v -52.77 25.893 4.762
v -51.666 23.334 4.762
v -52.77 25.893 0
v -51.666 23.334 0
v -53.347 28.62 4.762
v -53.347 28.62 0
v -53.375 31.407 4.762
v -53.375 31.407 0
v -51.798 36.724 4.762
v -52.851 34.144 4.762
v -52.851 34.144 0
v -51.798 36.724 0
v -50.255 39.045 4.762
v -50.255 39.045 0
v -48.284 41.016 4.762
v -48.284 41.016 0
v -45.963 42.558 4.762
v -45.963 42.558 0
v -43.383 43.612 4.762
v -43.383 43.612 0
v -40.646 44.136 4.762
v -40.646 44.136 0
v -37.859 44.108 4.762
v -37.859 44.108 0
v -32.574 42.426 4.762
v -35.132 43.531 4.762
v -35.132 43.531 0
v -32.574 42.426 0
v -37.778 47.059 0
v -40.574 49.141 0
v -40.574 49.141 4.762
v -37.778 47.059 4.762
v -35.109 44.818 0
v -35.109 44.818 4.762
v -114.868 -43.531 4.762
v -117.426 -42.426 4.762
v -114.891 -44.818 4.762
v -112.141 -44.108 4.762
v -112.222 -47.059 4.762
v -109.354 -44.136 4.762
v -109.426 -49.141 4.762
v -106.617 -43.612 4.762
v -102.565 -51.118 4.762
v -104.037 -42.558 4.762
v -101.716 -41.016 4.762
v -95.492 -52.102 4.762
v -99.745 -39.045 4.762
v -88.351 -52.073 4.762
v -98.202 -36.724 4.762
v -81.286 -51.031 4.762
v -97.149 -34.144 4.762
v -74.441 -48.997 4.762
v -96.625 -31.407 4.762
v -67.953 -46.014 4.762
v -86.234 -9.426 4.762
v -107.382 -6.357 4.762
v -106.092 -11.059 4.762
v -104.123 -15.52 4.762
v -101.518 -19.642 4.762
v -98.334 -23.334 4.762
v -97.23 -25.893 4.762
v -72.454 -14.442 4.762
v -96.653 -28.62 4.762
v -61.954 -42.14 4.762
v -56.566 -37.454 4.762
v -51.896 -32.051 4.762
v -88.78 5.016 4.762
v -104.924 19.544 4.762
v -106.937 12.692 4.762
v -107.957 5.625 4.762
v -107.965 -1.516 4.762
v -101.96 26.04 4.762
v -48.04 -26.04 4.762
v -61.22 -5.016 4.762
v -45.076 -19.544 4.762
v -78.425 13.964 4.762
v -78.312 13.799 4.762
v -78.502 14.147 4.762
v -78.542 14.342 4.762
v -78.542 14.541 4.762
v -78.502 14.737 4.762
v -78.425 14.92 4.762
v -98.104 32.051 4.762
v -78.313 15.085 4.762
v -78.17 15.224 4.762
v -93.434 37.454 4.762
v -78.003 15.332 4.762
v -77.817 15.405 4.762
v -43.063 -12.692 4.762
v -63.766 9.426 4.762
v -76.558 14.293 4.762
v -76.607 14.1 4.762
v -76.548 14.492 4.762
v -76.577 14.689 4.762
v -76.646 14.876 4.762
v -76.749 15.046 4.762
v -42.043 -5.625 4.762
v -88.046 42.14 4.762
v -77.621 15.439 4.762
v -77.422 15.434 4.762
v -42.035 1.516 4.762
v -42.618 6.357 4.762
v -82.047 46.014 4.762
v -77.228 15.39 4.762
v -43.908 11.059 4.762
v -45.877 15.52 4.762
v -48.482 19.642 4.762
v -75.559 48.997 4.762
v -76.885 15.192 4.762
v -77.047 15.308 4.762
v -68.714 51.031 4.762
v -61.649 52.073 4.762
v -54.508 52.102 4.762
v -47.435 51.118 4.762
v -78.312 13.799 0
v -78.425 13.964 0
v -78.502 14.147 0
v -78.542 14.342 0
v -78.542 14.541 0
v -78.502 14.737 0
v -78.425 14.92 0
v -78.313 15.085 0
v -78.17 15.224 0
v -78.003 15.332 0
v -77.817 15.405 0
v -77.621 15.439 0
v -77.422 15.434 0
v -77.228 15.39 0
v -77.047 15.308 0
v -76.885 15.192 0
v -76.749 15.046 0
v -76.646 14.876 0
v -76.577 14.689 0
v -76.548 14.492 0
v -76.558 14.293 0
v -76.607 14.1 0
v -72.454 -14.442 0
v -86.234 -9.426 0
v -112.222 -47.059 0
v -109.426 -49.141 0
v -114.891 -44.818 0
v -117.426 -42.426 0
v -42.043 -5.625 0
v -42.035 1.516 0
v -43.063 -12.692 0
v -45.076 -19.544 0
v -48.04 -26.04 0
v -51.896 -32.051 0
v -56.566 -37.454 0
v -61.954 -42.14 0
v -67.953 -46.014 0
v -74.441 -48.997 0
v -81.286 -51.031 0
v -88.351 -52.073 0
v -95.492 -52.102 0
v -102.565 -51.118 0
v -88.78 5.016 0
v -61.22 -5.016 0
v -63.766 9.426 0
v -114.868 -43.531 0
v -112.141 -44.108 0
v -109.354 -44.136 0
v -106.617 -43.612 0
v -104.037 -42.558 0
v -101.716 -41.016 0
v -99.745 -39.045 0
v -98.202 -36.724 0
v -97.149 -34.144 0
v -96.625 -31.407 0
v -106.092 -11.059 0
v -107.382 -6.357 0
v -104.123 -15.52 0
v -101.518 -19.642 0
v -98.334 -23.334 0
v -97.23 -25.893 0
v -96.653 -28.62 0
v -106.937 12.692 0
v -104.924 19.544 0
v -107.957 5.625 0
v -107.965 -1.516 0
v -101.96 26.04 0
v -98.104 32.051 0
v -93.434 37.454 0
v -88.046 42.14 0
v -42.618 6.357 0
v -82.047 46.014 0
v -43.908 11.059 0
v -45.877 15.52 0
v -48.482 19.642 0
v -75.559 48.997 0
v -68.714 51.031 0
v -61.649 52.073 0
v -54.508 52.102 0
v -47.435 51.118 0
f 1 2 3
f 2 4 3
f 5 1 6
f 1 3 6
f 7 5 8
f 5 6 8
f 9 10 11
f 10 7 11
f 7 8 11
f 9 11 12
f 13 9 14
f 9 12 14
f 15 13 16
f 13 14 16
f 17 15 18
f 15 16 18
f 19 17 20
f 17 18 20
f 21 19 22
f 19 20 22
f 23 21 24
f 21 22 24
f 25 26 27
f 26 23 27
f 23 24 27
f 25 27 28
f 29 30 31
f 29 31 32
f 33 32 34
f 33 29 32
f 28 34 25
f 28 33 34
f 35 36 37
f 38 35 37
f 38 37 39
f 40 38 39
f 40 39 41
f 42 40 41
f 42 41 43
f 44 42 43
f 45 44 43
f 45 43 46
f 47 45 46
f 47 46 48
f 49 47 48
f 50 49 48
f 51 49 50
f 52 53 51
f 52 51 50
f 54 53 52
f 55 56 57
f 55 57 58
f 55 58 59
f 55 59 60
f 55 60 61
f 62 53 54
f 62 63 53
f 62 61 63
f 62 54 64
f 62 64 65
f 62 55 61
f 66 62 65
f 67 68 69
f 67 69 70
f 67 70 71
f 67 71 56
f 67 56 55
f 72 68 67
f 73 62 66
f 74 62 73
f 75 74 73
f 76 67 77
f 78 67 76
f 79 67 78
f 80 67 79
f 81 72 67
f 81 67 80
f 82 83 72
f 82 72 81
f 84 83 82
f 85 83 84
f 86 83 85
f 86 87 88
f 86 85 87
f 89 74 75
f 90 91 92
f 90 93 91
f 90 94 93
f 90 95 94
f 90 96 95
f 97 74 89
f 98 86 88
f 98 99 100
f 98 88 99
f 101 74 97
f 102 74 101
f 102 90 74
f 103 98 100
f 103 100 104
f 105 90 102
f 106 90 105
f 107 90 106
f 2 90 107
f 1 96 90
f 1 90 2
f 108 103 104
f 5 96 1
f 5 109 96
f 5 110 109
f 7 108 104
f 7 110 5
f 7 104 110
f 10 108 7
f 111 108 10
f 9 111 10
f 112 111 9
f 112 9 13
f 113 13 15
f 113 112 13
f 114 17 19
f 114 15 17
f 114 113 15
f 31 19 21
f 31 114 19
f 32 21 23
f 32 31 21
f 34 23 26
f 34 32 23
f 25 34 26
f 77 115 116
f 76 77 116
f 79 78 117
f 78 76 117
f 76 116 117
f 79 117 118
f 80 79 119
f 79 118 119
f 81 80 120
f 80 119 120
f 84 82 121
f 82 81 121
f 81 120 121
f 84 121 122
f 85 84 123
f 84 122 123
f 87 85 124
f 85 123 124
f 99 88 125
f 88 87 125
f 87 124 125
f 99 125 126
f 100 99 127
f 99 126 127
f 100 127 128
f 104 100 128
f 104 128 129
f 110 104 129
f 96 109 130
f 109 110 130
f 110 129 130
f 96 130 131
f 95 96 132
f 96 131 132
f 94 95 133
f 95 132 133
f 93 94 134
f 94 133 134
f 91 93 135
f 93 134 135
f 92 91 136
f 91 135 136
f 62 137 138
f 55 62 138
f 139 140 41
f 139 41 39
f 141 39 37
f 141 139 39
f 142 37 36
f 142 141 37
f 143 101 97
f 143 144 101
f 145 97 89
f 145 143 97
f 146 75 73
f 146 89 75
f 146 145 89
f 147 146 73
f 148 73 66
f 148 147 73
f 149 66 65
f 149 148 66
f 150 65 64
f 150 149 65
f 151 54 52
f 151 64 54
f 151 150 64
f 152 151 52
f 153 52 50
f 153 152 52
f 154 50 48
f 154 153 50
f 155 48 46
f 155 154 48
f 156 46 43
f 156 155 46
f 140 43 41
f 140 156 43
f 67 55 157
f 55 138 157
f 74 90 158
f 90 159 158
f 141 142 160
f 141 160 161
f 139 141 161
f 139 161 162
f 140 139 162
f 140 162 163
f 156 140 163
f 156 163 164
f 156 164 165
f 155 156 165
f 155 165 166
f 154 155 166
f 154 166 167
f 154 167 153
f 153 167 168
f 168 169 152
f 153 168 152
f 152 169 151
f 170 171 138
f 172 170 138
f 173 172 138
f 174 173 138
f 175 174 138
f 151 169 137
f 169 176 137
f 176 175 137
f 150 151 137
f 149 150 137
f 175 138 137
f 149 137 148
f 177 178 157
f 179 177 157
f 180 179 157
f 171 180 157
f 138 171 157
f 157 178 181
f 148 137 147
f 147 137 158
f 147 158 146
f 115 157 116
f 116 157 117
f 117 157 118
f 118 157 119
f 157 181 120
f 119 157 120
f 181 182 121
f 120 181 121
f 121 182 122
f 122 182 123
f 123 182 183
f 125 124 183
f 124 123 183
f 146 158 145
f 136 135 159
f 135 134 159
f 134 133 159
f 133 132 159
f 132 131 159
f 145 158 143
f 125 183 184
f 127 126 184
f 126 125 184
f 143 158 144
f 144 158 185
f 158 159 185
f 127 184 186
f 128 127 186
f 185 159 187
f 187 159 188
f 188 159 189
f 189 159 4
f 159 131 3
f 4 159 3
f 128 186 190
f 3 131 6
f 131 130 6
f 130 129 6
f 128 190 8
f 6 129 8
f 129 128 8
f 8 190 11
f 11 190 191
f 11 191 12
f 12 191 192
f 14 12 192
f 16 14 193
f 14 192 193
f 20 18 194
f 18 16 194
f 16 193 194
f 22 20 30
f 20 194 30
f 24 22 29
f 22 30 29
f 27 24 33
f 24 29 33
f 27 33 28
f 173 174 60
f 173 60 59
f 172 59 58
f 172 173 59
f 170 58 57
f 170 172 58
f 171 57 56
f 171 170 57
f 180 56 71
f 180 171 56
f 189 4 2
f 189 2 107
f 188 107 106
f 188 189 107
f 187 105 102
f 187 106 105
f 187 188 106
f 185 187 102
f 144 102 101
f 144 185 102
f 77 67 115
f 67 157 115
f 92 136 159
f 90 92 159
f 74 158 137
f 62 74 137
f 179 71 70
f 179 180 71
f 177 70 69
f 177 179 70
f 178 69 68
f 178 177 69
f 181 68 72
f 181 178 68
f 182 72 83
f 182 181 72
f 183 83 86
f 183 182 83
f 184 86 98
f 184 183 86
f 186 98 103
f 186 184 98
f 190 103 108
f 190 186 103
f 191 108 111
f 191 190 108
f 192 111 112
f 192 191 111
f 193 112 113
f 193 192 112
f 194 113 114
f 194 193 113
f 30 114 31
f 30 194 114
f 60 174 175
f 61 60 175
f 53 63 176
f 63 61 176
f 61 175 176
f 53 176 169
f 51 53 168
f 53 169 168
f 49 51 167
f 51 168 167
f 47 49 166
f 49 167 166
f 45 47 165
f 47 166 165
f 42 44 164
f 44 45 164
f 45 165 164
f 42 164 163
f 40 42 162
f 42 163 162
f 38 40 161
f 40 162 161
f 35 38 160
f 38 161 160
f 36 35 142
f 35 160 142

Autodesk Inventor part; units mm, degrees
ref_plane "YZ Plane" through (0, 0, 0) normal (1, 0, 0) x (0, 1, 0)
ref_plane "XZ Plane" through (0, 0, 0) normal (0, 1, 0) x (-1, 0, 0)
ref_plane "XY Plane" through (0, 0, 0) normal (0, 0, 1) x (1, 0, 0)
sketch "Sketch1" plane through (0, 0, 0) normal (0, 0, 1) x (1, 0, 0)
  arc A0 (-32.5736, 42.4264) -> (-51.6655, 23.3345) centre (-39.3901, 30.151) ccw
  arc A1 (-32.5736, 42.4264) -> (-40.5736, 49.1408) centre (-75, 0) ccw
  arc A2 (-40.5736, 49.1408) -> (-107.9651, -1.5164) centre (-57.8736, 2.0002) ccw
  arc A3 (-107.9651, -1.5164) -> (-98.3345, -23.3345) centre (-75, 0) ccw
  arc A4 (-117.4264, -42.4264) -> (-98.3345, -23.3345) centre (-110.6099, -30.151) ccw
  arc A5 (-117.4264, -42.4264) -> (-109.4264, -49.1408) centre (-75, 0) ccw
  arc A6 (-109.4264, -49.1408) -> (-42.0348, 1.5164) centre (-92.1264, -2.0002) ccw
  arc A7 (-42.0348, 1.5164) -> (-51.6655, 23.3345) centre (-75, 0) ccw
  line L0 (-76.6068, 14.0999) -> (-63.7662, 9.4263)
  line L1 (-63.7662, 9.4263) -> (-61.2197, -5.0156)
  line L2 (-61.2197, -5.0156) -> (-72.4535, -14.4419)
  line L3 (-72.4535, -14.4419) -> (-86.2338, -9.4263)
  line L4 (-86.2338, -9.4263) -> (-88.7803, 5.0156)
  line L5 (-88.7803, 5.0156) -> (-78.3125, 13.7991)
  arc A8 (-76.6068, 14.0999) -> (-78.3125, 13.7991) centre (-77.5465, 14.4419) ccw
  arc A9 (-40.5736, 49.1408) -> (-107.9651, -1.5164) centre (-57.8736, 2.0002) ccw
  arc A10 (-107.9651, -1.5164) -> (-98.3345, -23.3345) centre (-75, 0) ccw
  arc A11 (-117.4264, -42.4264) -> (-98.3345, -23.3345) centre (-110.6099, -30.151) ccw
  arc A12 (-117.4264, -42.4264) -> (-109.4264, -49.1408) centre (-75, 0) ccw
  arc A13 (-109.4264, -49.1408) -> (-42.0348, 1.5164) centre (-92.1264, -2.0002) ccw
  arc A14 (-42.0348, 1.5164) -> (-51.6655, 23.3345) centre (-75, 0) ccw
  arc A15 (-32.5736, 42.4264) -> (-51.6655, 23.3345) centre (-39.3901, 30.151) ccw
  arc A16 (-32.5736, 42.4264) -> (-40.5736, 49.1408) centre (-75, 0) ccw
  point P0 (0, 0)
extrude "Extrusion1" add sketch "Sketch1" along normal blind 4.7625
properties part number "3-16inch_Knife1_Piece1"
